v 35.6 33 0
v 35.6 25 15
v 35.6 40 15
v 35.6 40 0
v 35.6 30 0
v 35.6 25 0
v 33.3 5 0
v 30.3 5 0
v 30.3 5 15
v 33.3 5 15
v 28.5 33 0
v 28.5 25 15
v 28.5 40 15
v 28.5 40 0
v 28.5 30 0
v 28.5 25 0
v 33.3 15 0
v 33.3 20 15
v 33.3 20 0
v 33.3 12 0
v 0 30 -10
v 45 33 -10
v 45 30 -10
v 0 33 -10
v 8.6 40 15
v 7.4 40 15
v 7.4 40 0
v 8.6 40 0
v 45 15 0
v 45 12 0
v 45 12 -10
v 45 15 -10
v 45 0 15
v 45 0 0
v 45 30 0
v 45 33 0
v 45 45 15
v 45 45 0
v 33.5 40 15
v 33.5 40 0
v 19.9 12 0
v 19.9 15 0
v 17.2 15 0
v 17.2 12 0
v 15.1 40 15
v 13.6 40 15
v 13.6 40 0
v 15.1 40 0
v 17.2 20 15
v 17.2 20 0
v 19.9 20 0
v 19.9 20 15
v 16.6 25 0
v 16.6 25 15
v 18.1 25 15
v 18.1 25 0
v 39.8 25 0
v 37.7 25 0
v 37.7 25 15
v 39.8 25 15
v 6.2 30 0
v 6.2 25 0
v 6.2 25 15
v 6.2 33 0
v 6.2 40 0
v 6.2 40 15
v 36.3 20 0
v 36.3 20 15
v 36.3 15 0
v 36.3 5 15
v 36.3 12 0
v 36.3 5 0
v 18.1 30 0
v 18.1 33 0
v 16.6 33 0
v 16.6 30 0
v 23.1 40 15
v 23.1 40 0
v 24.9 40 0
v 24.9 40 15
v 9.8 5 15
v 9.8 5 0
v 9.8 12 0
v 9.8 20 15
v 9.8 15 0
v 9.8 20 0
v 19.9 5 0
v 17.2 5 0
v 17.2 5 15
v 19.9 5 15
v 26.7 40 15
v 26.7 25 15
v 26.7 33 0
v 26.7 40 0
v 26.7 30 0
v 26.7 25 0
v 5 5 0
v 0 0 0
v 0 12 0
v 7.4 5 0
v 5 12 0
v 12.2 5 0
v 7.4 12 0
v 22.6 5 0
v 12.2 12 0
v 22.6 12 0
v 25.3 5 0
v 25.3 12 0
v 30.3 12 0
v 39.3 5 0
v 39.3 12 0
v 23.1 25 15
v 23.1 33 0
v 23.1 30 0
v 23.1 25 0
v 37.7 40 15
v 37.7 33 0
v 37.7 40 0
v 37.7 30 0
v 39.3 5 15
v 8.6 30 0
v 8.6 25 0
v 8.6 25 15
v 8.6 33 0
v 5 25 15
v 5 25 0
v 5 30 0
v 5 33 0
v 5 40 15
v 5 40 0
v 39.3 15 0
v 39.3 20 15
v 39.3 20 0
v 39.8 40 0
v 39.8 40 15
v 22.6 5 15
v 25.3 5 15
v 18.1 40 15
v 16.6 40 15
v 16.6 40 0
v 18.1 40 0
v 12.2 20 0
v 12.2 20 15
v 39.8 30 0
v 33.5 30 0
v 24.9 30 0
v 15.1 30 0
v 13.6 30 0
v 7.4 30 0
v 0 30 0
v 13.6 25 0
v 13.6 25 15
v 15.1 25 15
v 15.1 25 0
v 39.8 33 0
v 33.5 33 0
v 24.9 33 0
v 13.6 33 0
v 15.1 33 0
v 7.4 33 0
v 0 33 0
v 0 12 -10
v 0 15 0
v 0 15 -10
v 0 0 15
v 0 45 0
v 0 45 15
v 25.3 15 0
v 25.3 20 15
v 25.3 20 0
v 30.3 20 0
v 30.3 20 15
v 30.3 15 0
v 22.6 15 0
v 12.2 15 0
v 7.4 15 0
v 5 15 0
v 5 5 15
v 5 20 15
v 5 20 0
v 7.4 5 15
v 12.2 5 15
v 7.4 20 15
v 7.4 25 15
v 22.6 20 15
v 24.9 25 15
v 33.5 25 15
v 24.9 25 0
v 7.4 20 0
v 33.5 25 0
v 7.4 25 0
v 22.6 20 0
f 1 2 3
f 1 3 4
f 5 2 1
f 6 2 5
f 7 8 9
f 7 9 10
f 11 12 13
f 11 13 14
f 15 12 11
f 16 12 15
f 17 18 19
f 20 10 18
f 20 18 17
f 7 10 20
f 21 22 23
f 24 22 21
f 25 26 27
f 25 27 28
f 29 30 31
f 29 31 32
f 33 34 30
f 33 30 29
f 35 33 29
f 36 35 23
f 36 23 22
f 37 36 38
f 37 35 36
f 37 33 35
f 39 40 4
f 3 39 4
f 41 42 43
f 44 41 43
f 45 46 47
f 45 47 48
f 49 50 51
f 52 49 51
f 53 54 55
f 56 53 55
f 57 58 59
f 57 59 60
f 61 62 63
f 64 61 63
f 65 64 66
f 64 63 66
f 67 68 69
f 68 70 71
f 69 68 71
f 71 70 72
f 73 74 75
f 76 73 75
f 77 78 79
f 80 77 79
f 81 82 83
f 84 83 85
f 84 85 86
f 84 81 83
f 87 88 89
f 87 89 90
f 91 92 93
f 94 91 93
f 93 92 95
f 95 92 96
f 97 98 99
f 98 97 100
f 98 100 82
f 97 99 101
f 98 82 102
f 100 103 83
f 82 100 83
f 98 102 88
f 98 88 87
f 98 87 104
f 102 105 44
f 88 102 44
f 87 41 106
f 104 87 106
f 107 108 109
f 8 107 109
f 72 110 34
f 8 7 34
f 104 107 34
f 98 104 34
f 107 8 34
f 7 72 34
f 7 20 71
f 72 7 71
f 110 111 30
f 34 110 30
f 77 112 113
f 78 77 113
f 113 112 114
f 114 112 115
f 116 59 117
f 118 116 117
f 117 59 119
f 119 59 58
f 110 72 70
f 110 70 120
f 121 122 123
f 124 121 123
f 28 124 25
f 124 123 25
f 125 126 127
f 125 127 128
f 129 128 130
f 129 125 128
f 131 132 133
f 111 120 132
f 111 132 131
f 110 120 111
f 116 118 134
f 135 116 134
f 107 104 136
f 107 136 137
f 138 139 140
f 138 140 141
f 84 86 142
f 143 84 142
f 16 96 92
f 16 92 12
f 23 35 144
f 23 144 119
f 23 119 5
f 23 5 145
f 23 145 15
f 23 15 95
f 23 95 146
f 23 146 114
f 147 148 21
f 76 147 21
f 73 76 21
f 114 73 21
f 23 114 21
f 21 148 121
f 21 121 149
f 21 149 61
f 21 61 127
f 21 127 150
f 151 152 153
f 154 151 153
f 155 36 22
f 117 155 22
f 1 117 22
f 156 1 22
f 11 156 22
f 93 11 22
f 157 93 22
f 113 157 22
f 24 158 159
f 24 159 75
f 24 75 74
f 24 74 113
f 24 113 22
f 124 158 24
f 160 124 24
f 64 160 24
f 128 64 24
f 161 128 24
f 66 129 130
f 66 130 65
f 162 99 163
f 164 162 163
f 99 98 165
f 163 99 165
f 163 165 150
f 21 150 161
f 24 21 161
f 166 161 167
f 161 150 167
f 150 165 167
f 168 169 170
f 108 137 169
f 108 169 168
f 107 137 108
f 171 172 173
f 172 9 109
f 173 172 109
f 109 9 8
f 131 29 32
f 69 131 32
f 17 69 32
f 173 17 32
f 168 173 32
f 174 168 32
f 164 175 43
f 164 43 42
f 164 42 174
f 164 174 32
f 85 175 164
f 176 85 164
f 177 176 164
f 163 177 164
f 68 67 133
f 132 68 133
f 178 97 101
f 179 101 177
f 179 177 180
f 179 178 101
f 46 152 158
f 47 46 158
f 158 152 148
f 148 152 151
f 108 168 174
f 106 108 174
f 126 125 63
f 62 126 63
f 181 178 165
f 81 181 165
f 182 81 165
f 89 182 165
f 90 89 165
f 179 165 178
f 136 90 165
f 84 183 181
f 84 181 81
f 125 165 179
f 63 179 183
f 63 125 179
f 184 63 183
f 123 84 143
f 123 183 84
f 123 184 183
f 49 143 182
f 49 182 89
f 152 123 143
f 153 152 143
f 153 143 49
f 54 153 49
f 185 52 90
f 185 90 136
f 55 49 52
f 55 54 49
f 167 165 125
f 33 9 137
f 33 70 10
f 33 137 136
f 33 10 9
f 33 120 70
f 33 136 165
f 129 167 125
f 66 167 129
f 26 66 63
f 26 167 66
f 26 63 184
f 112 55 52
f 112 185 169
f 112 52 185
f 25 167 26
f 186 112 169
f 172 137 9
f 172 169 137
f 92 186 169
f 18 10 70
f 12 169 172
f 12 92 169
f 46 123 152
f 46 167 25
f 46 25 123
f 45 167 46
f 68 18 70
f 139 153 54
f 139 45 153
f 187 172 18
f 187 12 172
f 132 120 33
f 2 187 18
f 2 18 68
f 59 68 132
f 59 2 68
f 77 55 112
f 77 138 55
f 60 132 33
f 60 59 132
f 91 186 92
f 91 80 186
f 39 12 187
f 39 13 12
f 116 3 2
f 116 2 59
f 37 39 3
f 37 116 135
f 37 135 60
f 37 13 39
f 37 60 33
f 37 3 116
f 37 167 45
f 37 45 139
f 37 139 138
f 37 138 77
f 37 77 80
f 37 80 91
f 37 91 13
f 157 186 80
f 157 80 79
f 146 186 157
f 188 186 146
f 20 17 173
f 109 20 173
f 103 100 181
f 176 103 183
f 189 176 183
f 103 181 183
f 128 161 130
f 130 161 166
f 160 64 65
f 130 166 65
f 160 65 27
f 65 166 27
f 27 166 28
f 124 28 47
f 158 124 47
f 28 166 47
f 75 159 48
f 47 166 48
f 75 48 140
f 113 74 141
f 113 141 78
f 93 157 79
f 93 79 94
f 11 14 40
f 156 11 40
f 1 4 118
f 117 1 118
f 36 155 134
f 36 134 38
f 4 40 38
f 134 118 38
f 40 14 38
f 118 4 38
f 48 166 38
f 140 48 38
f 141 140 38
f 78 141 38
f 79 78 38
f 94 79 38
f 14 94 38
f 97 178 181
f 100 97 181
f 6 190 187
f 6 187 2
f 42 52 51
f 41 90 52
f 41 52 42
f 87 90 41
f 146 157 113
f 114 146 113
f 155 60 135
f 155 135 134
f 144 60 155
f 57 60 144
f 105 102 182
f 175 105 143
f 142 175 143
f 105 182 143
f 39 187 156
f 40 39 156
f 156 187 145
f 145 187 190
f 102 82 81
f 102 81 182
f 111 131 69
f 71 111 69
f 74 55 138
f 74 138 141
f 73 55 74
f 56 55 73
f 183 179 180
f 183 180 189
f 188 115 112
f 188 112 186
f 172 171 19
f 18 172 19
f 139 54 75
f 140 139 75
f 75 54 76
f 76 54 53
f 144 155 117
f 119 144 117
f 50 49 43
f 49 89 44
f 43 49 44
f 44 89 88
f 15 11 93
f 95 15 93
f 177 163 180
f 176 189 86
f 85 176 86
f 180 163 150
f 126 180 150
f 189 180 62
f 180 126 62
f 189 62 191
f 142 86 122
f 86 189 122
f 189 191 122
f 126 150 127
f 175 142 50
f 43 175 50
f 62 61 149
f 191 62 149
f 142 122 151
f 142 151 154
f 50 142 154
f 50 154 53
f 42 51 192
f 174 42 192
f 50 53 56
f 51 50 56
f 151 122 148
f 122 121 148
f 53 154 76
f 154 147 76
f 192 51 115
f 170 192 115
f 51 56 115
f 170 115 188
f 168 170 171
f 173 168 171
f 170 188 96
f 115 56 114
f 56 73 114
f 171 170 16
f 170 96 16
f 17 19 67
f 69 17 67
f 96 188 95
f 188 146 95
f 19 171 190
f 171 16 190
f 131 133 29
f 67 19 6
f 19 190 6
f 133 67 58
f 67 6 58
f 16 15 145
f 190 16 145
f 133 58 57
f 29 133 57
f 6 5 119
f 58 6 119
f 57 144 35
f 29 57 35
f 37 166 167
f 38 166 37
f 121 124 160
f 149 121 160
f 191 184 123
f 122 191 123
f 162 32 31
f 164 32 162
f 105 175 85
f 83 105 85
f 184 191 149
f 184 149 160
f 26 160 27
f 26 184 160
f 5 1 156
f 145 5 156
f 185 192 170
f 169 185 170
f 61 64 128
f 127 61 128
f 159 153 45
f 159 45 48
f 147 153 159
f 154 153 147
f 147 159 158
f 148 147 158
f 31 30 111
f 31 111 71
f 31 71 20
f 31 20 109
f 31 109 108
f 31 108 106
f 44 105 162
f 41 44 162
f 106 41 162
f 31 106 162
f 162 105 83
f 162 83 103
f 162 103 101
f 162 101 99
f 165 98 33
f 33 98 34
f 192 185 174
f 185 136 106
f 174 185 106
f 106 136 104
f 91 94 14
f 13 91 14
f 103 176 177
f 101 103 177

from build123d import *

# Parameters (mm, degrees)
BASE_W            = 45
BASE_H            = 45
BLOCK_DEPTH       = 15
SKETCH5_W         = 1.2
SKETCH5_H         = 15
ROW_1_SEED_DEPTH  = 66.383484153
ROW_1_START       = 25
ROW_1_OUTLINE_W   = 2.1
ROW_1_OUTLINE_H   = 15
ROW_1_OUTLINE_W_2 = 1.8
ROW_1_OUTLINE_W_3 = 1.5
ROW_1_DEPTH       = 15
SKETCH6_W         = 2.4
SKETCH6_H         = 15
ROW_2_SEED_DEPTH  = 66.383484153
ROW_2_START       = 5
ROW_2_OUTLINE_W   = 3
ROW_2_OUTLINE_H   = 15
ROW_2_OUTLINE_W_2 = 2.7
ROW_2_DEPTH       = 15
SKETCH8_W         = 45
SKETCH8_H         = 3
ADAPTER_DEPTH     = 10


# Read off the part's stored shape, not the designer's step: row-1, row-2
with BuildPart() as part:
    # base → block (new body)
    with BuildSketch(Plane.XY):
        with Locations((22.5, 22.5)):
            Rectangle(BASE_W, BASE_H)
    extrude(amount=BLOCK_DEPTH)

    # Sketch5 → row-1-seed (cut, through all)
    with BuildSketch(Plane.XY.offset(15)):
        with Locations((5.6, 32.5)):
            Rectangle(SKETCH5_W, SKETCH5_H)
        with Locations((8, 32.5)):
            Rectangle(SKETCH5_W, SKETCH5_H)
    extrude(amount=-ROW_1_SEED_DEPTH, mode=Mode.SUBTRACT)

    # row-1 outline → row-1 (cut)
    with BuildSketch(Plane(origin=(0, 0, 0), x_dir=(1, 0, 0), z_dir=(0, 1, 0)).offset(ROW_1_START)):
        with Locations((38.75, -7.5)):
            Rectangle(ROW_1_OUTLINE_W, ROW_1_OUTLINE_H)
        with Locations((34.55, -7.5)):
            Rectangle(ROW_1_OUTLINE_W, ROW_1_OUTLINE_H)
        with Locations((27.6, -7.5)):
            Rectangle(ROW_1_OUTLINE_W_2, ROW_1_OUTLINE_H)
        with Locations((24, -7.5)):
            Rectangle(ROW_1_OUTLINE_W_2, ROW_1_OUTLINE_H)
        with Locations((17.35, -7.5)):
            Rectangle(ROW_1_OUTLINE_W_3, ROW_1_OUTLINE_H)
        with Locations((14.35, -7.5)):
            Rectangle(ROW_1_OUTLINE_W_3, ROW_1_OUTLINE_H)
    extrude(amount=ROW_1_DEPTH, mode=Mode.SUBTRACT)

    # Sketch6 → row-2-seed (cut, through all)
    with BuildSketch(Plane.XY.offset(15)):
        with Locations((6.2, 12.5)):
            Rectangle(SKETCH6_W, SKETCH6_H)
        with Locations((11, 12.5)):
            Rectangle(SKETCH6_W, SKETCH6_H)
    extrude(amount=-ROW_2_SEED_DEPTH, mode=Mode.SUBTRACT)

    # row-2 outline → row-2 (cut)
    with BuildSketch(Plane(origin=(0, 0, 0), x_dir=(1, 0, 0), z_dir=(0, 1, 0)).offset(ROW_2_START)):
        with Locations((37.8, -7.5)):
            Rectangle(ROW_2_OUTLINE_W, ROW_2_OUTLINE_H)
        with Locations((31.8, -7.5)):
            Rectangle(ROW_2_OUTLINE_W, ROW_2_OUTLINE_H)
        with Locations((23.95, -7.5)):
            Rectangle(ROW_2_OUTLINE_W_2, ROW_2_OUTLINE_H)
        with Locations((18.55, -7.5)):
            Rectangle(ROW_2_OUTLINE_W_2, ROW_2_OUTLINE_H)
    extrude(amount=ROW_2_DEPTH, mode=Mode.SUBTRACT)

    # Sketch8 → adapter (add)
    with BuildSketch(Plane(origin=(0, 0, 0), x_dir=(-1, 0, 0), z_dir=(0, 0, -1))):
        with Locations((-22.5, 31.5)):
            Rectangle(SKETCH8_W, SKETCH8_H)
        with Locations((-22.5, 13.5)):
            Rectangle(SKETCH8_W, SKETCH8_H)
    extrude(amount=ADAPTER_DEPTH)


solid = part.part
